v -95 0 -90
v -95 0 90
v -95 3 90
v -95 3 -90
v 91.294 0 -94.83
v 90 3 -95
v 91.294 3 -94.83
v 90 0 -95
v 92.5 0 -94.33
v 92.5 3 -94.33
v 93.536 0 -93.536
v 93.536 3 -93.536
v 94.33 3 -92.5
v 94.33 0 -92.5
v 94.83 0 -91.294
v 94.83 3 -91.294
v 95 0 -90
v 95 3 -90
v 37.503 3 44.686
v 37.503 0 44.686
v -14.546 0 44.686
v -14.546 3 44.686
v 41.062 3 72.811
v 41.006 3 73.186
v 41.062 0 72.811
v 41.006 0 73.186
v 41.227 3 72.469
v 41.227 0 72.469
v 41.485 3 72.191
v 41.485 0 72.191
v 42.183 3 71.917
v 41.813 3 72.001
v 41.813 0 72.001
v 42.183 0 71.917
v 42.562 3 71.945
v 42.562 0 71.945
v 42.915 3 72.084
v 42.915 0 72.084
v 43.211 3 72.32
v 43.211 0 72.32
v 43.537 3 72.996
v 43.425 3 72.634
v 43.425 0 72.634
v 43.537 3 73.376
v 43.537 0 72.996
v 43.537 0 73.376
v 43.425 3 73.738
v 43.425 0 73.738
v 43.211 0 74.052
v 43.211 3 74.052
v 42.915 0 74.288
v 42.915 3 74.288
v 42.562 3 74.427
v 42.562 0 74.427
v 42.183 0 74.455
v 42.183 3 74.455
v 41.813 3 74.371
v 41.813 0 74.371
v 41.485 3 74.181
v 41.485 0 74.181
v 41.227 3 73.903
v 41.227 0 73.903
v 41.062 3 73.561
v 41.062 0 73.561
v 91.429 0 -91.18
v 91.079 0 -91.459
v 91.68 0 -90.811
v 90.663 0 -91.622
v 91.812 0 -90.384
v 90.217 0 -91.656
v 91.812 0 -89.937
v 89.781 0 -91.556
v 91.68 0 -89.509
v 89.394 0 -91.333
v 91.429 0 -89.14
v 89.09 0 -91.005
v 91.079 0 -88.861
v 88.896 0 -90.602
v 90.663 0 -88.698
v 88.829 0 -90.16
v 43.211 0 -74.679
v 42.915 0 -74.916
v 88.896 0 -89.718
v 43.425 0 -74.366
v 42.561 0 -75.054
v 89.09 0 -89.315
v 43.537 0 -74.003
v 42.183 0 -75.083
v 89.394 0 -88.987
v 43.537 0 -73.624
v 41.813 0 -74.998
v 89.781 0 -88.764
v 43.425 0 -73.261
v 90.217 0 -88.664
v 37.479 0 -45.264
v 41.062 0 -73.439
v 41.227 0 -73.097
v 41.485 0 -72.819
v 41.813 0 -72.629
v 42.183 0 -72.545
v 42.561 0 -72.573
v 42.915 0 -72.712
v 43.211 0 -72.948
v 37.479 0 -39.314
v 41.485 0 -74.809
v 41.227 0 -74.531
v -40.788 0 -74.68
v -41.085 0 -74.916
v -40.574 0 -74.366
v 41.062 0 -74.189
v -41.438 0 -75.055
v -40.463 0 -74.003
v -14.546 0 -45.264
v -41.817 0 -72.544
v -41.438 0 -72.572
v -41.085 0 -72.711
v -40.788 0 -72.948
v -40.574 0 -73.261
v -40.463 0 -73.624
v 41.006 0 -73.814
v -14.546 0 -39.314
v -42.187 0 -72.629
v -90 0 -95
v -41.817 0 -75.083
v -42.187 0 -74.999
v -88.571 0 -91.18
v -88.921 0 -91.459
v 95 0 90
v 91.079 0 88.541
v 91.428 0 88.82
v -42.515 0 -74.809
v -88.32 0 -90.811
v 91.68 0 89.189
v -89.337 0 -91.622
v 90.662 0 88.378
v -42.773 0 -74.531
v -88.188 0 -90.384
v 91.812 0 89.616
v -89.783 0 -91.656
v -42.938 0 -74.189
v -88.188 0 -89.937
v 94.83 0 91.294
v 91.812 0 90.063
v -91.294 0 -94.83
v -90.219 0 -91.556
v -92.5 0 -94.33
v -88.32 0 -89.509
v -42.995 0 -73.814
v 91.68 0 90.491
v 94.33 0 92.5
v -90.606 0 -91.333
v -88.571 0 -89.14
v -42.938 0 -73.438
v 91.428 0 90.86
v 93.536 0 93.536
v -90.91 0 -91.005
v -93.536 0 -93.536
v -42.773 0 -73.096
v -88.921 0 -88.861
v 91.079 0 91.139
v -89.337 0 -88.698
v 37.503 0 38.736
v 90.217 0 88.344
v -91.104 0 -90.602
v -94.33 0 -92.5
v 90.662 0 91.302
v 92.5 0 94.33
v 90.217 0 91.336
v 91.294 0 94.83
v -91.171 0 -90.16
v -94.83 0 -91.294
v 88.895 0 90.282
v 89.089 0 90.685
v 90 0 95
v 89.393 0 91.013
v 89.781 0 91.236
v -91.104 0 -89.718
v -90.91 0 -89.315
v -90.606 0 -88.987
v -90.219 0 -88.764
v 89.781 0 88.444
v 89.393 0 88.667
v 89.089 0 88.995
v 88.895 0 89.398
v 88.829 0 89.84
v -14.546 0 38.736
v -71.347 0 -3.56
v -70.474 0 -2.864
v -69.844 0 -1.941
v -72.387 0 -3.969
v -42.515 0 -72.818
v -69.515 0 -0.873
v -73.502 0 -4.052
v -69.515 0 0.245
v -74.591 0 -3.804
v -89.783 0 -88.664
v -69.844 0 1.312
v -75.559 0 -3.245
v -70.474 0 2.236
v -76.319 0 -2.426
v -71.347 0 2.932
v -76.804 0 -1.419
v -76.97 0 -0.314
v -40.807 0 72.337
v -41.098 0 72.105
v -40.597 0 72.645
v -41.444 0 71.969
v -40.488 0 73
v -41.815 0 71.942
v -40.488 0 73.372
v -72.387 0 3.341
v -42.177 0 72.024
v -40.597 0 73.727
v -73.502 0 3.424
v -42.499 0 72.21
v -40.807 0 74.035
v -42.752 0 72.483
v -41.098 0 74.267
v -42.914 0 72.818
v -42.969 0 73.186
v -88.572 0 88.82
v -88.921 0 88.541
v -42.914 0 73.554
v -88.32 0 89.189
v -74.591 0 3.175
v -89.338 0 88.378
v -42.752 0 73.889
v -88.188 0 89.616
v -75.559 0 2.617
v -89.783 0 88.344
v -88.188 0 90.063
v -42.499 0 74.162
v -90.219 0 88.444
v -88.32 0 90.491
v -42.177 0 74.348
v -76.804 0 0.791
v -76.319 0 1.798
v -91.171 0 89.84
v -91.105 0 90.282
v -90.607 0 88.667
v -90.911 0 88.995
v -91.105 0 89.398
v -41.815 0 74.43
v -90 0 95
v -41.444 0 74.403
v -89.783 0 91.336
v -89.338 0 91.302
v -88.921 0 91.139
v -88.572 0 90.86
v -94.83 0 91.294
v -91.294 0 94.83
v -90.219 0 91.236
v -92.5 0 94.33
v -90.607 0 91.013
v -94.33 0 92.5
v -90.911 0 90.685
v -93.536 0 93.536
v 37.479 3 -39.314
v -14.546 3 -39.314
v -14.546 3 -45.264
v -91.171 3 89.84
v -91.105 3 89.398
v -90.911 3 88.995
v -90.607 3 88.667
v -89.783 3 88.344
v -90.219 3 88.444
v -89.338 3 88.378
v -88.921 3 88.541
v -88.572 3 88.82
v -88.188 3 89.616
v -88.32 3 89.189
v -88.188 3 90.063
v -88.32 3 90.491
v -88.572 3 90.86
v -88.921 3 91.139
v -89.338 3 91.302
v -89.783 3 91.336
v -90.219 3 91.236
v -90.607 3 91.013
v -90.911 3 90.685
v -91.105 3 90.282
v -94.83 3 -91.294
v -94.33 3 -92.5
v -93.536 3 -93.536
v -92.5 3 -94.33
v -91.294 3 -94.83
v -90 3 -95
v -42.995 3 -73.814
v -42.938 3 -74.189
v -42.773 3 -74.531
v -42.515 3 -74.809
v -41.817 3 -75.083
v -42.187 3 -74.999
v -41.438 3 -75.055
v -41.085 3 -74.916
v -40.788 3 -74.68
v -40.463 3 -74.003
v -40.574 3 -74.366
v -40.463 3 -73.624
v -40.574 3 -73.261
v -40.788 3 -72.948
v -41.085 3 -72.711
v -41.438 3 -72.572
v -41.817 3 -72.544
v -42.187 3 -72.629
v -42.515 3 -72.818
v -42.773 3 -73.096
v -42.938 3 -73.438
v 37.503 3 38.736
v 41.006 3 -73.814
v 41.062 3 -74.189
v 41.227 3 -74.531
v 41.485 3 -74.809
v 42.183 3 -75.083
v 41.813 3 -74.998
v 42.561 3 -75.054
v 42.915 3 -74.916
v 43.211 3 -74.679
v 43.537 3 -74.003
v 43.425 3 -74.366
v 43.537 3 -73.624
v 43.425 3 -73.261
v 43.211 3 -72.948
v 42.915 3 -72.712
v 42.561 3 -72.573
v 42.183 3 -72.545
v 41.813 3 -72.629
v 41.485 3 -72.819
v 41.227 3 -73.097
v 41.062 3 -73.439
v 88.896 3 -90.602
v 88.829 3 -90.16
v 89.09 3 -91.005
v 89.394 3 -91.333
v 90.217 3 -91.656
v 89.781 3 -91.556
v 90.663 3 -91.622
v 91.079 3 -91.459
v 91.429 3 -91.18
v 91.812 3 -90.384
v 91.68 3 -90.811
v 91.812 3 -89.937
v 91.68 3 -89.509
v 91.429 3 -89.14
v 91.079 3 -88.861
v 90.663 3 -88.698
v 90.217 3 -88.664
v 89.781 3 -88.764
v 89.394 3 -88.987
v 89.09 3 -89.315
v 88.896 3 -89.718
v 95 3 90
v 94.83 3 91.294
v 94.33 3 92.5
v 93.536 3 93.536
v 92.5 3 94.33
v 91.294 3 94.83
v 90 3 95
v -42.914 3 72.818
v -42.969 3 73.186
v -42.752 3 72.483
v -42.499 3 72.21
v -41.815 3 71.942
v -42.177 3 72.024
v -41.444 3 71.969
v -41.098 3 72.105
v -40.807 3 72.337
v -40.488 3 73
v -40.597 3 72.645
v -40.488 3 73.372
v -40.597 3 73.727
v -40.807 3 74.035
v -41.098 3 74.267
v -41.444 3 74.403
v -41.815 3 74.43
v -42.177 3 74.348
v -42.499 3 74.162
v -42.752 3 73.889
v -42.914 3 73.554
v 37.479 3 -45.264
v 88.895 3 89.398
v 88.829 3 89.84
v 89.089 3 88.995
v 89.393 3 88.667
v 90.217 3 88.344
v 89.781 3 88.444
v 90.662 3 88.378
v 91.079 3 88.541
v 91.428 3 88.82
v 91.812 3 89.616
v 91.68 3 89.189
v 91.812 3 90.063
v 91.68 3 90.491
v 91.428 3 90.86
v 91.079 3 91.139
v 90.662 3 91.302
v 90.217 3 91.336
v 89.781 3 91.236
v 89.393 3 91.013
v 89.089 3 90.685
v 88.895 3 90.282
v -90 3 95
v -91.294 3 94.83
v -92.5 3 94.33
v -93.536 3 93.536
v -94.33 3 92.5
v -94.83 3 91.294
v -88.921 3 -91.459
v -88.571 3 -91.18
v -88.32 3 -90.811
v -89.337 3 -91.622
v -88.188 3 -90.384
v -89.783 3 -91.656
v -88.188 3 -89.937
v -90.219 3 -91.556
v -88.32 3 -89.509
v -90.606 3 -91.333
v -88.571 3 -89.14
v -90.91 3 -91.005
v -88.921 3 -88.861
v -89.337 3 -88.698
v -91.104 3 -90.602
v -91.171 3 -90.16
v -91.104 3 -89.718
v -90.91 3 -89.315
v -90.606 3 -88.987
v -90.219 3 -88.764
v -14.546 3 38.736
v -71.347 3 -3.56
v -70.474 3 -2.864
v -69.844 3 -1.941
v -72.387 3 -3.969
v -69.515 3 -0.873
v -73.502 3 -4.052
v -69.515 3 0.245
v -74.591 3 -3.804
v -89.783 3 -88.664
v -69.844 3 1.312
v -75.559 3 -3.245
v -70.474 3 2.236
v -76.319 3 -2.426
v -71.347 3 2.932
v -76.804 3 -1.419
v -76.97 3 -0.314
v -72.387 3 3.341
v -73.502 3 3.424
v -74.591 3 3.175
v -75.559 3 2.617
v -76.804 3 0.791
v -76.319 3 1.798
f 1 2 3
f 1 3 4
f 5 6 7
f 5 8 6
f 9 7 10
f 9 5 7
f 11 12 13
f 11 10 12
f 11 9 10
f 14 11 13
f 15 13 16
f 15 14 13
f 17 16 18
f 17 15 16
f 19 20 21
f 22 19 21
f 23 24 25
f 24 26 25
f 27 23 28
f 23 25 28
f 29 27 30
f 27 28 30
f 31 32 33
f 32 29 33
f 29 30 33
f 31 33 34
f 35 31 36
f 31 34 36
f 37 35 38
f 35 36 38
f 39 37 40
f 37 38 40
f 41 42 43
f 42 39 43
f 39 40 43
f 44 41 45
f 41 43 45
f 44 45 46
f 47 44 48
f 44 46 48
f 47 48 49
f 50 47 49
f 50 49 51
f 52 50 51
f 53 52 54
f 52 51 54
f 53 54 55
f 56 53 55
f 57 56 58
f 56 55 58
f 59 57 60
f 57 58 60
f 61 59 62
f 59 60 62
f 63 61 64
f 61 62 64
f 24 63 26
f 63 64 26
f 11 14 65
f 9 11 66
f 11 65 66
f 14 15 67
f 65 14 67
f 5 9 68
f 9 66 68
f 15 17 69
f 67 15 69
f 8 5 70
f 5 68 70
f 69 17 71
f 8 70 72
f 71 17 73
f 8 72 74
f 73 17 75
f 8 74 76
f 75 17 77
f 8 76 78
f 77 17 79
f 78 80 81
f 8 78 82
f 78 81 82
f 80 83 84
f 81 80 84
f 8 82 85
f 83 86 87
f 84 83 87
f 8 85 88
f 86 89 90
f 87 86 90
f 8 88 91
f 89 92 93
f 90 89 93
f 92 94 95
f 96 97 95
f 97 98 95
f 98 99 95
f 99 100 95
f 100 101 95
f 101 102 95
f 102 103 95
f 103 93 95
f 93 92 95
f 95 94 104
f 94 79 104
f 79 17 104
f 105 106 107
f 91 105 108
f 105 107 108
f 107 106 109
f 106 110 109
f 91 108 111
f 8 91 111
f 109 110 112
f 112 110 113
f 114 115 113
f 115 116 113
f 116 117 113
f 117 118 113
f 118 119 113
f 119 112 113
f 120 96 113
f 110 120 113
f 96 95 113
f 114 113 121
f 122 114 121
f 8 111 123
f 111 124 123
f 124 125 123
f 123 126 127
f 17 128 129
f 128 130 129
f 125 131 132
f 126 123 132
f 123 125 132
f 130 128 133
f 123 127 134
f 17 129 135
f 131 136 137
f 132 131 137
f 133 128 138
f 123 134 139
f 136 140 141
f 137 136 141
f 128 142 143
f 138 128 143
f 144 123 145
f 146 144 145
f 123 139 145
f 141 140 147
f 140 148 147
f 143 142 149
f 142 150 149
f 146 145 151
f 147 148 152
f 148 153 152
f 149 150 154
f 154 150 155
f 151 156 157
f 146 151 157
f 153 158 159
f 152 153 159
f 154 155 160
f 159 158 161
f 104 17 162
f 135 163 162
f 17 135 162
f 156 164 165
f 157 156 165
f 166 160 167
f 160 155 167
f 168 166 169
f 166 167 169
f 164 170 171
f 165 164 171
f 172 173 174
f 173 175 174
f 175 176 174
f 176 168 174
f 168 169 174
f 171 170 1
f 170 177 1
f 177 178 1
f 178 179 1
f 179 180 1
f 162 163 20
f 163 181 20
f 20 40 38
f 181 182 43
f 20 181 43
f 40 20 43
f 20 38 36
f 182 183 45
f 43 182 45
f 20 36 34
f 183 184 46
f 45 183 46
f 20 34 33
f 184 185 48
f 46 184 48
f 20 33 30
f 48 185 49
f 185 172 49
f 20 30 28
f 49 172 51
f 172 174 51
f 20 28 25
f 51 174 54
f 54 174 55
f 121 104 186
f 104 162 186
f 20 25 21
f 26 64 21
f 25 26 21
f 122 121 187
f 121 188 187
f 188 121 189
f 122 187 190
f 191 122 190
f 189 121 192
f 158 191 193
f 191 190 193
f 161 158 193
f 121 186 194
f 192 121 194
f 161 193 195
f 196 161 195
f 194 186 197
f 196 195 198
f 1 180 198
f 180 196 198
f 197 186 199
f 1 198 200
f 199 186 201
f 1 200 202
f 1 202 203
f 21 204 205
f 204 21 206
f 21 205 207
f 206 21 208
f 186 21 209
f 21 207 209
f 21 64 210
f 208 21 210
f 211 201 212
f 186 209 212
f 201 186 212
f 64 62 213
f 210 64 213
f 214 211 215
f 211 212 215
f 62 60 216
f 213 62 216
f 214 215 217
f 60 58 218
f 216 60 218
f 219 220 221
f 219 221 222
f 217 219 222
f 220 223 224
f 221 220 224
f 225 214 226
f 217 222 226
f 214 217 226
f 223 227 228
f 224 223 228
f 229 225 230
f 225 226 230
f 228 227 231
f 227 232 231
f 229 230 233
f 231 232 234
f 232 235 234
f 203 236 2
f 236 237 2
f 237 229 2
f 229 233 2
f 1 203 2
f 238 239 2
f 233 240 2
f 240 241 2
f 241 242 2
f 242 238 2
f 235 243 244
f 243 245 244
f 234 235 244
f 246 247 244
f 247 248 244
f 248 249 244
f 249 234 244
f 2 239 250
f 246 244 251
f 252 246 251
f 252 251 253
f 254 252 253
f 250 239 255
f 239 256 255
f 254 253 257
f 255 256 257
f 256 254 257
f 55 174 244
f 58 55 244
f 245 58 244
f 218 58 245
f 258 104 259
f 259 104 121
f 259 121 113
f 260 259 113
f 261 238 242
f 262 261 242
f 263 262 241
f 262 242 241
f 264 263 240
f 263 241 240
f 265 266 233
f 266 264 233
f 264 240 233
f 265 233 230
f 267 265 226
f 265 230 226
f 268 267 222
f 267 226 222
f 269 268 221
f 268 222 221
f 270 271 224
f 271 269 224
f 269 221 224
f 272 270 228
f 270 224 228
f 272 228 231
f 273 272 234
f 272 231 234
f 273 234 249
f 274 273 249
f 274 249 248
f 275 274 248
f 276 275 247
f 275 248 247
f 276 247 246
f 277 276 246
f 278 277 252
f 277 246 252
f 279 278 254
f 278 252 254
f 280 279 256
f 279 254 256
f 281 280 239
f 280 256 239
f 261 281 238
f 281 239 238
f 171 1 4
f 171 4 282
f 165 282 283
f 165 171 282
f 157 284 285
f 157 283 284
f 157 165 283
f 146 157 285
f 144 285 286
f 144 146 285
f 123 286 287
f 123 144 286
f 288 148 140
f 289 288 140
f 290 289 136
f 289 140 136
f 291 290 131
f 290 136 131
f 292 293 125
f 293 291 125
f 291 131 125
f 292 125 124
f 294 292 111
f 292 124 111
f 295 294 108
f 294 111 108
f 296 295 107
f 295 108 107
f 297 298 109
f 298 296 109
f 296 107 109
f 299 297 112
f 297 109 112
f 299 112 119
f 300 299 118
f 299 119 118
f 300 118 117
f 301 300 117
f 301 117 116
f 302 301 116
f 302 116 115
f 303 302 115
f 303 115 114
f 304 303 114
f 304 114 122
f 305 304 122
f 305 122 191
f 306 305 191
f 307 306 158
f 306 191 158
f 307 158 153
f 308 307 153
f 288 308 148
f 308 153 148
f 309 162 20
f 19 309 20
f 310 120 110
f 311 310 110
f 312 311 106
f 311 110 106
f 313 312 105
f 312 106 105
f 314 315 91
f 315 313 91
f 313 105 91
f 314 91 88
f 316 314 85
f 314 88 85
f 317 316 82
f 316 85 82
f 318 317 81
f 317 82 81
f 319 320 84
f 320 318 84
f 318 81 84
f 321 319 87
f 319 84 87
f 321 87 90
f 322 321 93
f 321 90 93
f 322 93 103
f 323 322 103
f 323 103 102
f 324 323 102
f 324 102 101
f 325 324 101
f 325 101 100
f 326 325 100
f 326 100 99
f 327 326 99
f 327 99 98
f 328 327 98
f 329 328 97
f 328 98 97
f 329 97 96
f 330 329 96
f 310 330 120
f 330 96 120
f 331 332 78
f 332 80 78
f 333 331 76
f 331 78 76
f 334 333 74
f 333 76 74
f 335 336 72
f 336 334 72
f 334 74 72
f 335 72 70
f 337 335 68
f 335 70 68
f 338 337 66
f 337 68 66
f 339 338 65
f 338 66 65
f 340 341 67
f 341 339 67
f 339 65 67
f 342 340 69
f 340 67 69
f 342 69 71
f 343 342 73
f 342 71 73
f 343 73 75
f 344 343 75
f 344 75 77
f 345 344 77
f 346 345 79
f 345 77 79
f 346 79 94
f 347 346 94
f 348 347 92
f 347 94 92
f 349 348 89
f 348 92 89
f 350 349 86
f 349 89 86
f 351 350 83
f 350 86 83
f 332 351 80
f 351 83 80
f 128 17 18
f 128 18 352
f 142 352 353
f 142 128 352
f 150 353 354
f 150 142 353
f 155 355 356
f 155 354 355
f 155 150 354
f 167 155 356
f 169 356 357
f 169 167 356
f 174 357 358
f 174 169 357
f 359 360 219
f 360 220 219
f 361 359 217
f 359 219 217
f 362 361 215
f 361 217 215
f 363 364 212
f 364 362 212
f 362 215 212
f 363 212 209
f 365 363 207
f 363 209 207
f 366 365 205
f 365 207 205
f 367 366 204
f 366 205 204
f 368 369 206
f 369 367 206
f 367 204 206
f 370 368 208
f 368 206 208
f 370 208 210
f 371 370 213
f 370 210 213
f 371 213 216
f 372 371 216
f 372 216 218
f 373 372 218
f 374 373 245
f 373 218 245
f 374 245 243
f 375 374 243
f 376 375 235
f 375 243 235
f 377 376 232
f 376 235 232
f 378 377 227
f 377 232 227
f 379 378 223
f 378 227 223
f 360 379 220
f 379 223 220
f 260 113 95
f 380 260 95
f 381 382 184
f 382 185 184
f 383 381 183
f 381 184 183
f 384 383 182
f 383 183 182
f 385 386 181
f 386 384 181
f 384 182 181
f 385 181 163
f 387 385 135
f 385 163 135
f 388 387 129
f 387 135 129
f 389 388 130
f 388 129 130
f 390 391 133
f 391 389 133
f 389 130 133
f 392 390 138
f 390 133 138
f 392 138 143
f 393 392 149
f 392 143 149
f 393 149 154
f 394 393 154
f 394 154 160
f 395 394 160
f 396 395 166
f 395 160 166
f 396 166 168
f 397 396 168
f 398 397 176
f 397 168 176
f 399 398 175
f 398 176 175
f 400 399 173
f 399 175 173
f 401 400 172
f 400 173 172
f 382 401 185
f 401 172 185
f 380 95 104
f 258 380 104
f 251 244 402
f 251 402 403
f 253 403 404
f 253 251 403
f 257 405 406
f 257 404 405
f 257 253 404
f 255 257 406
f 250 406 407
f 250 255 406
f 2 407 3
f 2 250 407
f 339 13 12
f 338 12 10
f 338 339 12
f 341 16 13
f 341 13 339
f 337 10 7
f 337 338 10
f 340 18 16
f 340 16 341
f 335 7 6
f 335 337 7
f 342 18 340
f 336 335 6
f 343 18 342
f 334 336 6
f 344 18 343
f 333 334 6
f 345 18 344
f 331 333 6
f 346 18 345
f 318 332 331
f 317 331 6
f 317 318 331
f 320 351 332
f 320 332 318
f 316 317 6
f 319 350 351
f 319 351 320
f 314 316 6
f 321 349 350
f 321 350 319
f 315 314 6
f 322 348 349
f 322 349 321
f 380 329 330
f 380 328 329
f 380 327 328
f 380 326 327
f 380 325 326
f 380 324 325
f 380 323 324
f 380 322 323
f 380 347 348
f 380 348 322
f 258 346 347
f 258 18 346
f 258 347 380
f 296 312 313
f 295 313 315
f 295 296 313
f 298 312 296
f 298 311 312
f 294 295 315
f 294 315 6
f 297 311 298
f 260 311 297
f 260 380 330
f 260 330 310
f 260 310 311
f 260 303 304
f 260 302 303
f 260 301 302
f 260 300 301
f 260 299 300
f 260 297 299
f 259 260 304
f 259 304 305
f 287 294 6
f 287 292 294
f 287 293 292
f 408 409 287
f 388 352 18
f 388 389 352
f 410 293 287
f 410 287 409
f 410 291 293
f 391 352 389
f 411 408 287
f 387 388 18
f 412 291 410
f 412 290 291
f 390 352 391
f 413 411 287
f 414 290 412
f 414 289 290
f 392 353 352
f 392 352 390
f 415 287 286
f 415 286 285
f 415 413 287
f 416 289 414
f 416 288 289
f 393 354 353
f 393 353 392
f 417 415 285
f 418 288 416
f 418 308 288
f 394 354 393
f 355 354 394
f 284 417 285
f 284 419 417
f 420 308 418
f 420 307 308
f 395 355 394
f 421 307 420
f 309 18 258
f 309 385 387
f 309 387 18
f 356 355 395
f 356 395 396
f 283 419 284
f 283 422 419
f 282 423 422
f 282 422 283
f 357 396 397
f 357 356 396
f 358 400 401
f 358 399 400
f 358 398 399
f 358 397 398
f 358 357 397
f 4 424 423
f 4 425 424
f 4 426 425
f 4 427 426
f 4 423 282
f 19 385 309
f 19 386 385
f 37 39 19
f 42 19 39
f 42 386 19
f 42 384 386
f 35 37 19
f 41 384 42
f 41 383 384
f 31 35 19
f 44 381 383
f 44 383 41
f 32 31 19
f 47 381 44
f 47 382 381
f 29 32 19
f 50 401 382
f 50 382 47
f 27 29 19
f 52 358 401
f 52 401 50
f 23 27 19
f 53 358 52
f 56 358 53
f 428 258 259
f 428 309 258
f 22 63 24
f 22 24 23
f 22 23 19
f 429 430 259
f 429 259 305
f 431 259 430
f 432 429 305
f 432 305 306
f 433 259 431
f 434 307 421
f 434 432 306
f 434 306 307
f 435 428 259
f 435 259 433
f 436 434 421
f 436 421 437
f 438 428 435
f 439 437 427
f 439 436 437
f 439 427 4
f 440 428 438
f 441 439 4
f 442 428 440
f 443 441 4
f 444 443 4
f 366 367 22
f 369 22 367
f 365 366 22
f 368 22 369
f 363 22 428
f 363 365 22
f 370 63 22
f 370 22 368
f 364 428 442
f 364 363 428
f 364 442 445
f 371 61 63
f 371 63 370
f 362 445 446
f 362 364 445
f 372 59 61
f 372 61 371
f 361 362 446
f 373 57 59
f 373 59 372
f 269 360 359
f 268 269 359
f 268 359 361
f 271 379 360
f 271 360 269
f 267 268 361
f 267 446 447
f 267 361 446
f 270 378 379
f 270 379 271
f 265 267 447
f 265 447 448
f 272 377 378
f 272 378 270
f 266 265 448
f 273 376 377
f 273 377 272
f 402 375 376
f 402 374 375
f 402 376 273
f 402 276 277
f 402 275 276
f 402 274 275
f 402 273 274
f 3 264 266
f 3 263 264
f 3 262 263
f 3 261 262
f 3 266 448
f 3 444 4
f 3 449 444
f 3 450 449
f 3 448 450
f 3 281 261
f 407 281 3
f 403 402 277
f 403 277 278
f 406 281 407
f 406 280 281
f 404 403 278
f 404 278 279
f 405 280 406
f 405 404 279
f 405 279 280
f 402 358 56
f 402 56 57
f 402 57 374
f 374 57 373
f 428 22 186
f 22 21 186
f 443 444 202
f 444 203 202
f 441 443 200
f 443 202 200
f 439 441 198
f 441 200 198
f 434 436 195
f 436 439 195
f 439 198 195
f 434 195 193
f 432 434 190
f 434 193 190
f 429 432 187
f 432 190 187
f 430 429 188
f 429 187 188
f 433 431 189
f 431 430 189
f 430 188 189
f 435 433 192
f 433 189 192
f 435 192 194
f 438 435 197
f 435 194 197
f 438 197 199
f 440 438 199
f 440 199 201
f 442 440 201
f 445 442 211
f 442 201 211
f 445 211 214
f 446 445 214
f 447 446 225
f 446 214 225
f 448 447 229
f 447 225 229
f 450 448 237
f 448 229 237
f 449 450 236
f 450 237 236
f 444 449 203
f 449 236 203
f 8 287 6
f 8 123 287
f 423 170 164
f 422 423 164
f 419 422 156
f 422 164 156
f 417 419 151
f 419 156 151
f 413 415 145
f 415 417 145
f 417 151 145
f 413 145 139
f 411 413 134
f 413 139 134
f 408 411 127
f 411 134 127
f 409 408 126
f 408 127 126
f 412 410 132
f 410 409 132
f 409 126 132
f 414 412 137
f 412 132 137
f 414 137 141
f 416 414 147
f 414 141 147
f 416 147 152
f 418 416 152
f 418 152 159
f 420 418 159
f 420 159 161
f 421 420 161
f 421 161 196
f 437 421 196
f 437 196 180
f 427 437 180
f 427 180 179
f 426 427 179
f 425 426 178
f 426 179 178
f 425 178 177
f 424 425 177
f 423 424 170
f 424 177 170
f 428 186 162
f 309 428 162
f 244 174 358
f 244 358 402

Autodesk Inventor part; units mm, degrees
ref_plane "YZ Plane" through (0, 0, 0) normal (1, 0, 0) x (0, 1, 0)
ref_plane "XZ Plane" through (0, 0, 0) normal (0, 1, 0) x (-1, 0, 0)
ref_plane "XY Plane" through (0, 0, 0) normal (0, 0, 1) x (1, 0, 0)
sketch "Sketch1" plane through (0, 0, 0) normal (0, 1, 0) x (-1, 0, 0)
  line L0 (-90, 95) -> (90, 95)
  line L1 (95, 90) -> (95, -90)
  line L2 (90, -95) -> (-90, -95)
  line L3 (-95, -90) -> (-95, 90)
  line L4 (-37.5033, 38.736) -> (-37.5033, 44.686)
  line L5 (-37.5033, 44.686) -> (14.5465, 44.686)
  line L6 (14.5465, 44.686) -> (14.5465, 38.736)
  line L7 (14.5465, 38.736) -> (-37.5033, 38.736)
  line L8 (-37.4788, -45.2638) -> (-37.4788, -39.3138)
  line L9 (-37.4788, -39.3138) -> (14.5465, -39.3138)
  line L10 (14.5465, -39.3138) -> (14.5465, -45.2638)
  line L11 (14.5465, -45.2638) -> (-37.4788, -45.2638)
  circle A0 centre (41.7215, 73.186) radius 1.2478
  circle A1 centre (73.2215, -0.3141) radius 3.7486
  circle A2 centre (41.7215, -73.8137) radius 1.2732
  circle A3 centre (-42.2782, -73.8137) radius 1.2727
  circle A4 centre (-42.2783, 73.186) radius 1.2728
  circle A5 centre (89.6714, 89.8399) radius 1.5
  circle A6 centre (89.671, -90.1601) radius 1.5
  circle A7 centre (-90.329, -90.1601) radius 1.5
  circle A8 centre (-90.3286, 89.8399) radius 1.5
  arc A9 (90, -95) -> (95, -90) centre (90, -90) ccw
  arc A10 (-95, -90) -> (-90, -95) centre (-90, -90) ccw
  arc A11 (-90, 95) -> (-95, 90) centre (-90, 90) ccw
  arc A12 (95, 90) -> (90, 95) centre (90, 90) ccw
  point P0 (-95, 95)
  point P1 (95, 95)
  point P2 (95, -95)
  point P3 (-95, -95)
  point P4 (0, 0)
  point P5 (0, 0)
  dimension "d4" = 3
  dimension "d0" = 3
  dimension "d1" = 3
  dimension "d2" = 3
  dimension "d3" = 3
  dimension "d6" = 5
  dimension "d7" = 95
  dimension "d8" = 95
  dimension "d9" = 180
  dimension "d10" = 180
  dimension "d11" = 180
  dimension "d12" = 180
  dimension "d13" = 190
  dimension "d14" = 190
  dimension "d15" = 73.5001
  dimension "d16" = 31.5
  dimension "d17" = 95
  dimension "d18" = 95
extrude "Extrusion1" add sketch "Sketch1" along normal blind 3
properties part number "Old case New Board Adapter" material "Glass"
